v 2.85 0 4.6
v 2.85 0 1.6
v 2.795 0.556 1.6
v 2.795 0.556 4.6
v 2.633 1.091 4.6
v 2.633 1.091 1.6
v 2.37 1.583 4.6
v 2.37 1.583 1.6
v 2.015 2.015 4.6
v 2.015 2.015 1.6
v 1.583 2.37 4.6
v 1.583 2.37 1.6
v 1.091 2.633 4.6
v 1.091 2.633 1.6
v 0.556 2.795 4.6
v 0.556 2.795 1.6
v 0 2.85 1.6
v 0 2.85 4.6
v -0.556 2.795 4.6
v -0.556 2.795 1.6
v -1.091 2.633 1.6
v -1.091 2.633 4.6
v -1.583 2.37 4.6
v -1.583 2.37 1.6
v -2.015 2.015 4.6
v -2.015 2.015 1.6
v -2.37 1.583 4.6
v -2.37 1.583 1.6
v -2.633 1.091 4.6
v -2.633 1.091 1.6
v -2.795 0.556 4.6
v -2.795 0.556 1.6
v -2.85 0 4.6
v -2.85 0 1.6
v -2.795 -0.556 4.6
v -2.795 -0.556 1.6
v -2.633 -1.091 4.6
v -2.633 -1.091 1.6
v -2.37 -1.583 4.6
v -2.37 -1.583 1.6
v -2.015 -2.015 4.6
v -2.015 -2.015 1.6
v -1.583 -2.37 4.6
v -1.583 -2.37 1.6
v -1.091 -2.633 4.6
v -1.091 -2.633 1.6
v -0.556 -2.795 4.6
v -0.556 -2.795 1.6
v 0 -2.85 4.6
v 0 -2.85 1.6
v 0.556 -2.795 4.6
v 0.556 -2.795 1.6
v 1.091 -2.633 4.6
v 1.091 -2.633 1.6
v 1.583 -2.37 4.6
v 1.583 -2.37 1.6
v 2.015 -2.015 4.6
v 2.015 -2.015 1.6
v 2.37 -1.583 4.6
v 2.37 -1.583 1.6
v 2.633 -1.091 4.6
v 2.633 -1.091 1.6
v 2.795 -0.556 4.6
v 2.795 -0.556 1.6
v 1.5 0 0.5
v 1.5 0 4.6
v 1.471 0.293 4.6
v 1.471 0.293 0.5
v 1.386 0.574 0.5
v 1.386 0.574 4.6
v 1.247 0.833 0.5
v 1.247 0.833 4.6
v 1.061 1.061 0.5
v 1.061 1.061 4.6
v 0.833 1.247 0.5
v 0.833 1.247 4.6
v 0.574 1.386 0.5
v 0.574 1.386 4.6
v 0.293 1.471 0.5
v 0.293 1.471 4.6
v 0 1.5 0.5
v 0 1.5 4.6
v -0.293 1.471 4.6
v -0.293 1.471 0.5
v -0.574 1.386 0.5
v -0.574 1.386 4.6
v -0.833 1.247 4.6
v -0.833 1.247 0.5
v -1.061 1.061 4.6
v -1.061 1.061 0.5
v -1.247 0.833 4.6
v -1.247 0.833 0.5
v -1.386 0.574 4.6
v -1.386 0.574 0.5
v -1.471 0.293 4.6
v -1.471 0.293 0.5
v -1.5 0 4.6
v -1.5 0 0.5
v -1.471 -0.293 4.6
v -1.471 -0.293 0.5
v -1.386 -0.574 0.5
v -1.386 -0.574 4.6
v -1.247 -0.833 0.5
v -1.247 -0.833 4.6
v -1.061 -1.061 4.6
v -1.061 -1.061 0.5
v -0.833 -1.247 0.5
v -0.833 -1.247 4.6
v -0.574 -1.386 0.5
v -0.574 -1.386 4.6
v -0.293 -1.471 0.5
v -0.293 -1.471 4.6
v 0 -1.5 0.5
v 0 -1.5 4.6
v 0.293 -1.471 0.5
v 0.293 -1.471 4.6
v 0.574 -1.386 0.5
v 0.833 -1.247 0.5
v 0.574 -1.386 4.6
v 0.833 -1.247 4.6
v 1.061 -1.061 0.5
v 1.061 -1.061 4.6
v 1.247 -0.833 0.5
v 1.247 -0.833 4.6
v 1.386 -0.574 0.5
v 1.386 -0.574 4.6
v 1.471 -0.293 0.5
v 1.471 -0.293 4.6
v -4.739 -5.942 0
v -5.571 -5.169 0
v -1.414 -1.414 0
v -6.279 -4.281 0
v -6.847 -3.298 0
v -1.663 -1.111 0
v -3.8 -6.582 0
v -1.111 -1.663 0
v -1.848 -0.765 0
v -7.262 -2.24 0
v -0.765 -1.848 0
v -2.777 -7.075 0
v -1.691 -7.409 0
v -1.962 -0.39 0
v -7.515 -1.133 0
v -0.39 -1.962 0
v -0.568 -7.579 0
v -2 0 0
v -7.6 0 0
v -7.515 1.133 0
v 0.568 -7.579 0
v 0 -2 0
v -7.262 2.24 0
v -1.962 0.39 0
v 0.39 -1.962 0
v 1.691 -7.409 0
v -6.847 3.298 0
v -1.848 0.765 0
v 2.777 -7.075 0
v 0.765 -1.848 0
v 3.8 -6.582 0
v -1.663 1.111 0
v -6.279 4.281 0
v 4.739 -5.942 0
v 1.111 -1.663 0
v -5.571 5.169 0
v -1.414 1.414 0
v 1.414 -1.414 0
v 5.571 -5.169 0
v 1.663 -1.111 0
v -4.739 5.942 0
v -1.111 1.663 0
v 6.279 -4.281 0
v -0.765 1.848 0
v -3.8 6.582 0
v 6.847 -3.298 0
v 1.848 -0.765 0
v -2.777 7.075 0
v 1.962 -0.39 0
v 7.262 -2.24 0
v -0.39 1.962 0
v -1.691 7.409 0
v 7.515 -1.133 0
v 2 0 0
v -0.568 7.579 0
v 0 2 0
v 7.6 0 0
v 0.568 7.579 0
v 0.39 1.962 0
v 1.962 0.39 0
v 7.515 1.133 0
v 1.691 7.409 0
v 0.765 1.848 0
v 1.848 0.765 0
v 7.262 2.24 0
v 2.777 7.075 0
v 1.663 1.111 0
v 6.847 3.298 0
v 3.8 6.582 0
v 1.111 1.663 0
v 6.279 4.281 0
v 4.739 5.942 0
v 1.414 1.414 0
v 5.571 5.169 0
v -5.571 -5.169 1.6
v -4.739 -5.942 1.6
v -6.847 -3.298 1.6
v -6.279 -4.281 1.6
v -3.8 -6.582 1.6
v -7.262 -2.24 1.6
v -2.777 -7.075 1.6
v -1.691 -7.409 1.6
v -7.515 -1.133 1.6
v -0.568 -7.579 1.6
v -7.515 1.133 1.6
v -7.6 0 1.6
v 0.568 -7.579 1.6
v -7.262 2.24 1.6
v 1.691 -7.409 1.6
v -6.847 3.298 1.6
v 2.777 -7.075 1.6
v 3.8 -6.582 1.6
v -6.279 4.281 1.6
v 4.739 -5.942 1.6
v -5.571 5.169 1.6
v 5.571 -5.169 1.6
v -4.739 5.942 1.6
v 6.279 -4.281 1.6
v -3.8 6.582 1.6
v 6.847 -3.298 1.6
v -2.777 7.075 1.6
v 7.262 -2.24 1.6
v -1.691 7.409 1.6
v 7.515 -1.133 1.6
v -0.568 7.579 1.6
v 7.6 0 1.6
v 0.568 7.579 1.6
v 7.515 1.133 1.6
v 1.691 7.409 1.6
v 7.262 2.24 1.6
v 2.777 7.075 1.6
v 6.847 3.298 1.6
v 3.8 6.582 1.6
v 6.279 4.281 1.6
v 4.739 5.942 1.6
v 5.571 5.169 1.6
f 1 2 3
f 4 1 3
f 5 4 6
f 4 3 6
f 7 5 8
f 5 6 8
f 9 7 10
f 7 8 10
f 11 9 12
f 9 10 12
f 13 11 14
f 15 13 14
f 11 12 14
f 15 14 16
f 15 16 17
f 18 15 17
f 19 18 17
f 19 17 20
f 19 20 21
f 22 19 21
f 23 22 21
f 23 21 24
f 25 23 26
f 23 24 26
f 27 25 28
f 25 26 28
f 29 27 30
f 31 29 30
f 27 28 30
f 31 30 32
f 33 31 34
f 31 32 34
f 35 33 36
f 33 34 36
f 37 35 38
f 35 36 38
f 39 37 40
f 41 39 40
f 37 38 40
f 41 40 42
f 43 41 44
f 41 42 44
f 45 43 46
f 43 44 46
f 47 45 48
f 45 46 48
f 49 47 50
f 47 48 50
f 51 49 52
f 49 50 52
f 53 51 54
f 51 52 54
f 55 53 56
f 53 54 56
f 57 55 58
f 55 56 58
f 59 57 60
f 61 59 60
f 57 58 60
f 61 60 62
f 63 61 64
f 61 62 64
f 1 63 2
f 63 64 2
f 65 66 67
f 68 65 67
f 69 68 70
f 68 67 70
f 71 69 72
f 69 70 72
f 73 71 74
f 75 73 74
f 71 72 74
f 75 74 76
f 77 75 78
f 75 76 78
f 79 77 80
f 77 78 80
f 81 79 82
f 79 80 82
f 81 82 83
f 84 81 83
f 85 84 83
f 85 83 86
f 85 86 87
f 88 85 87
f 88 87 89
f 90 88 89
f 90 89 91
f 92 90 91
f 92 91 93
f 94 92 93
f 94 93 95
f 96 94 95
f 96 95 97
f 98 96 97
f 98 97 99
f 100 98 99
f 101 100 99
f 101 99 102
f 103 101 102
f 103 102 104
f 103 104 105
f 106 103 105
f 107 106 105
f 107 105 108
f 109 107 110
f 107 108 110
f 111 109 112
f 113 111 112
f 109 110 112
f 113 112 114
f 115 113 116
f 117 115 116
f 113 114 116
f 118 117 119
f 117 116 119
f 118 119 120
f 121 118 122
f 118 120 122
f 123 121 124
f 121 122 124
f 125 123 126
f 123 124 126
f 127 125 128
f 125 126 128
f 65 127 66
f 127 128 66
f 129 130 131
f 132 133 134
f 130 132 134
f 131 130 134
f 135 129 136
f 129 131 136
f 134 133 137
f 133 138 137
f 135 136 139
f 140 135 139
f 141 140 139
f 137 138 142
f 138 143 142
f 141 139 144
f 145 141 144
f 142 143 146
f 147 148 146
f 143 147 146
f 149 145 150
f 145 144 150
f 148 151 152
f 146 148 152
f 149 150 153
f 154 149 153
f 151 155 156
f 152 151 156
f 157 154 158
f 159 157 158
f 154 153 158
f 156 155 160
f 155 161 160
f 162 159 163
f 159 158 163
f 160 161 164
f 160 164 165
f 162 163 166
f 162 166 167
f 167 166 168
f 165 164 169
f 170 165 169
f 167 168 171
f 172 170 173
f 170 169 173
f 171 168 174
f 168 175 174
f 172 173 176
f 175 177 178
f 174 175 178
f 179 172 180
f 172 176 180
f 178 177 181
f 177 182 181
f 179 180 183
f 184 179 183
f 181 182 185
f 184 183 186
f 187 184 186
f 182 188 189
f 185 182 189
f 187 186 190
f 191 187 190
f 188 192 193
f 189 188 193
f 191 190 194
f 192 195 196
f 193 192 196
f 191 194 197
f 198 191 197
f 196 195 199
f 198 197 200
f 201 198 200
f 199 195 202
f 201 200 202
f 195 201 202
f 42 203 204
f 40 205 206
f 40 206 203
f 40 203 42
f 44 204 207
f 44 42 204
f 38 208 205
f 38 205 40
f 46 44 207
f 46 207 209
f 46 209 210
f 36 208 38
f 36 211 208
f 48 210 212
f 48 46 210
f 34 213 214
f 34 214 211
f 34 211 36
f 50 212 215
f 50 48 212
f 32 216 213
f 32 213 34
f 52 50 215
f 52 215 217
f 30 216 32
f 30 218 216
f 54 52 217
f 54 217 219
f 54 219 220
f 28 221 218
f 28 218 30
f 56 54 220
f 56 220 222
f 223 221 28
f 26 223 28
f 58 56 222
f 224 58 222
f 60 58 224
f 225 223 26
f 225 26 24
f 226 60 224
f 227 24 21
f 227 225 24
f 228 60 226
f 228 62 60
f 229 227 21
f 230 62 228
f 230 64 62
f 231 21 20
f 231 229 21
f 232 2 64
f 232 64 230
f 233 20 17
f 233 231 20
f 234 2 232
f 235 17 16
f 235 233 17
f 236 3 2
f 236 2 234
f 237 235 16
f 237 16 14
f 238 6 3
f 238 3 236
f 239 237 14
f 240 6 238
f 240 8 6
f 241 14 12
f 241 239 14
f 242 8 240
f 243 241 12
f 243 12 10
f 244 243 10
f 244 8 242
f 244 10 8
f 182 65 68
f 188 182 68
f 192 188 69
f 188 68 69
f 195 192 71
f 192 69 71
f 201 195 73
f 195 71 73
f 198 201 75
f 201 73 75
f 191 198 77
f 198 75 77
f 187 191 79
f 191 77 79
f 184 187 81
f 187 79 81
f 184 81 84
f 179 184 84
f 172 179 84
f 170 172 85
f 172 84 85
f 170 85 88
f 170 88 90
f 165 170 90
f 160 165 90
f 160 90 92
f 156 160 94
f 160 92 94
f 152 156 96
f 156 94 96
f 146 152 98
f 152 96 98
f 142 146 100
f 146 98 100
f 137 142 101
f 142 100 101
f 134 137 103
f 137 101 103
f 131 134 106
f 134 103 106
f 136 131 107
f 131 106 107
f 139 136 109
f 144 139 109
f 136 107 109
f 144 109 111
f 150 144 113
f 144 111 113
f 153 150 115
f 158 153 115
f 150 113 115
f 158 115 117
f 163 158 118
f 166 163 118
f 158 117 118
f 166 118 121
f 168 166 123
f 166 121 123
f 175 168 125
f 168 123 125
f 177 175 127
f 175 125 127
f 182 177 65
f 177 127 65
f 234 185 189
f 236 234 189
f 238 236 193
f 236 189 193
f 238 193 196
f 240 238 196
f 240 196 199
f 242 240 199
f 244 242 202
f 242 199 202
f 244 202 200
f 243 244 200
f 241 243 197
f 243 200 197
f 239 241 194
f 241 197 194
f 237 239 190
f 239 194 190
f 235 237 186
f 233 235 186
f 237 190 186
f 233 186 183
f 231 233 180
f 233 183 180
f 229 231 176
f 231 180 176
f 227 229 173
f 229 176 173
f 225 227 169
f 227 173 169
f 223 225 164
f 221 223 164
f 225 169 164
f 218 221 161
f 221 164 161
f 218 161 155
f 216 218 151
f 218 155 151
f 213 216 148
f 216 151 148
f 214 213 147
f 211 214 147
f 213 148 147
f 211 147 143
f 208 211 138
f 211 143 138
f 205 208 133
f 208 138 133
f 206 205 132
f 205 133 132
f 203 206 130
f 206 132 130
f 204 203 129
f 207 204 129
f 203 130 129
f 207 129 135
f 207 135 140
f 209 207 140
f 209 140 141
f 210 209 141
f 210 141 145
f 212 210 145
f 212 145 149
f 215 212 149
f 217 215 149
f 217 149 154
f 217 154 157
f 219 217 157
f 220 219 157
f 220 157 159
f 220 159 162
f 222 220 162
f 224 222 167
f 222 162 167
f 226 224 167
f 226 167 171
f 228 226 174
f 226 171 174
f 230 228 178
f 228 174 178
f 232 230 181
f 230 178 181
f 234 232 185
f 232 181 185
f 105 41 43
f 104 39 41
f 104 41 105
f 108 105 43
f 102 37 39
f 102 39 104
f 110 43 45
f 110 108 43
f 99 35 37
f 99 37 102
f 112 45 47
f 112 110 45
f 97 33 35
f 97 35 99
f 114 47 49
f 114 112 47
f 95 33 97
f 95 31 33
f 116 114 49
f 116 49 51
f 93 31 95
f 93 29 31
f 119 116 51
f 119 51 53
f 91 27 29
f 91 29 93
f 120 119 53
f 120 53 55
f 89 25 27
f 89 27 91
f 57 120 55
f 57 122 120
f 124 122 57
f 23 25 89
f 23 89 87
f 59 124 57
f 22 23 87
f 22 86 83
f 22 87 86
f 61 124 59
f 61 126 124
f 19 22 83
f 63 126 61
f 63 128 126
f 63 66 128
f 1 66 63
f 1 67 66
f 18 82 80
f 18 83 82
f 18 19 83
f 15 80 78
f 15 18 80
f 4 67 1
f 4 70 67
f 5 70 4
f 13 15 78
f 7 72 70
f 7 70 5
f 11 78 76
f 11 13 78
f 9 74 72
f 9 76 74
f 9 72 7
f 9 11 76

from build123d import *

# Parameters (mm, degrees)
F0_R     = 7.6
F1_DEPTH = 1.6
F2_R     = 2.85
F3_DEPTH = 3
F4_R     = 1.5
F5_DEPTH = 25
F6_SIZE  = 0.5


with BuildPart() as f1:
    # F0 (on Top) → F1 (new body)
    with BuildSketch(Plane.XY):
        Circle(F0_R)
    extrude(amount=F1_DEPTH)

    # F2 (on face) → F3 (join)
    with BuildSketch(Plane.XY.offset(1.6)):
        Circle(F2_R)
    extrude(amount=F3_DEPTH)

    # F4 (on face) → F5 (cut)
    with BuildSketch(Plane.XY.offset(4.6)):
        Circle(F4_R)
    extrude(amount=-F5_DEPTH, mode=Mode.SUBTRACT)

    # F6
    f6_edges = [f1.edges().sort_by_distance(p)[0] for p in [
        (-1.5, 0, 0),
    ]]
    chamfer(f6_edges, length=F6_SIZE)


solid = f1.part
